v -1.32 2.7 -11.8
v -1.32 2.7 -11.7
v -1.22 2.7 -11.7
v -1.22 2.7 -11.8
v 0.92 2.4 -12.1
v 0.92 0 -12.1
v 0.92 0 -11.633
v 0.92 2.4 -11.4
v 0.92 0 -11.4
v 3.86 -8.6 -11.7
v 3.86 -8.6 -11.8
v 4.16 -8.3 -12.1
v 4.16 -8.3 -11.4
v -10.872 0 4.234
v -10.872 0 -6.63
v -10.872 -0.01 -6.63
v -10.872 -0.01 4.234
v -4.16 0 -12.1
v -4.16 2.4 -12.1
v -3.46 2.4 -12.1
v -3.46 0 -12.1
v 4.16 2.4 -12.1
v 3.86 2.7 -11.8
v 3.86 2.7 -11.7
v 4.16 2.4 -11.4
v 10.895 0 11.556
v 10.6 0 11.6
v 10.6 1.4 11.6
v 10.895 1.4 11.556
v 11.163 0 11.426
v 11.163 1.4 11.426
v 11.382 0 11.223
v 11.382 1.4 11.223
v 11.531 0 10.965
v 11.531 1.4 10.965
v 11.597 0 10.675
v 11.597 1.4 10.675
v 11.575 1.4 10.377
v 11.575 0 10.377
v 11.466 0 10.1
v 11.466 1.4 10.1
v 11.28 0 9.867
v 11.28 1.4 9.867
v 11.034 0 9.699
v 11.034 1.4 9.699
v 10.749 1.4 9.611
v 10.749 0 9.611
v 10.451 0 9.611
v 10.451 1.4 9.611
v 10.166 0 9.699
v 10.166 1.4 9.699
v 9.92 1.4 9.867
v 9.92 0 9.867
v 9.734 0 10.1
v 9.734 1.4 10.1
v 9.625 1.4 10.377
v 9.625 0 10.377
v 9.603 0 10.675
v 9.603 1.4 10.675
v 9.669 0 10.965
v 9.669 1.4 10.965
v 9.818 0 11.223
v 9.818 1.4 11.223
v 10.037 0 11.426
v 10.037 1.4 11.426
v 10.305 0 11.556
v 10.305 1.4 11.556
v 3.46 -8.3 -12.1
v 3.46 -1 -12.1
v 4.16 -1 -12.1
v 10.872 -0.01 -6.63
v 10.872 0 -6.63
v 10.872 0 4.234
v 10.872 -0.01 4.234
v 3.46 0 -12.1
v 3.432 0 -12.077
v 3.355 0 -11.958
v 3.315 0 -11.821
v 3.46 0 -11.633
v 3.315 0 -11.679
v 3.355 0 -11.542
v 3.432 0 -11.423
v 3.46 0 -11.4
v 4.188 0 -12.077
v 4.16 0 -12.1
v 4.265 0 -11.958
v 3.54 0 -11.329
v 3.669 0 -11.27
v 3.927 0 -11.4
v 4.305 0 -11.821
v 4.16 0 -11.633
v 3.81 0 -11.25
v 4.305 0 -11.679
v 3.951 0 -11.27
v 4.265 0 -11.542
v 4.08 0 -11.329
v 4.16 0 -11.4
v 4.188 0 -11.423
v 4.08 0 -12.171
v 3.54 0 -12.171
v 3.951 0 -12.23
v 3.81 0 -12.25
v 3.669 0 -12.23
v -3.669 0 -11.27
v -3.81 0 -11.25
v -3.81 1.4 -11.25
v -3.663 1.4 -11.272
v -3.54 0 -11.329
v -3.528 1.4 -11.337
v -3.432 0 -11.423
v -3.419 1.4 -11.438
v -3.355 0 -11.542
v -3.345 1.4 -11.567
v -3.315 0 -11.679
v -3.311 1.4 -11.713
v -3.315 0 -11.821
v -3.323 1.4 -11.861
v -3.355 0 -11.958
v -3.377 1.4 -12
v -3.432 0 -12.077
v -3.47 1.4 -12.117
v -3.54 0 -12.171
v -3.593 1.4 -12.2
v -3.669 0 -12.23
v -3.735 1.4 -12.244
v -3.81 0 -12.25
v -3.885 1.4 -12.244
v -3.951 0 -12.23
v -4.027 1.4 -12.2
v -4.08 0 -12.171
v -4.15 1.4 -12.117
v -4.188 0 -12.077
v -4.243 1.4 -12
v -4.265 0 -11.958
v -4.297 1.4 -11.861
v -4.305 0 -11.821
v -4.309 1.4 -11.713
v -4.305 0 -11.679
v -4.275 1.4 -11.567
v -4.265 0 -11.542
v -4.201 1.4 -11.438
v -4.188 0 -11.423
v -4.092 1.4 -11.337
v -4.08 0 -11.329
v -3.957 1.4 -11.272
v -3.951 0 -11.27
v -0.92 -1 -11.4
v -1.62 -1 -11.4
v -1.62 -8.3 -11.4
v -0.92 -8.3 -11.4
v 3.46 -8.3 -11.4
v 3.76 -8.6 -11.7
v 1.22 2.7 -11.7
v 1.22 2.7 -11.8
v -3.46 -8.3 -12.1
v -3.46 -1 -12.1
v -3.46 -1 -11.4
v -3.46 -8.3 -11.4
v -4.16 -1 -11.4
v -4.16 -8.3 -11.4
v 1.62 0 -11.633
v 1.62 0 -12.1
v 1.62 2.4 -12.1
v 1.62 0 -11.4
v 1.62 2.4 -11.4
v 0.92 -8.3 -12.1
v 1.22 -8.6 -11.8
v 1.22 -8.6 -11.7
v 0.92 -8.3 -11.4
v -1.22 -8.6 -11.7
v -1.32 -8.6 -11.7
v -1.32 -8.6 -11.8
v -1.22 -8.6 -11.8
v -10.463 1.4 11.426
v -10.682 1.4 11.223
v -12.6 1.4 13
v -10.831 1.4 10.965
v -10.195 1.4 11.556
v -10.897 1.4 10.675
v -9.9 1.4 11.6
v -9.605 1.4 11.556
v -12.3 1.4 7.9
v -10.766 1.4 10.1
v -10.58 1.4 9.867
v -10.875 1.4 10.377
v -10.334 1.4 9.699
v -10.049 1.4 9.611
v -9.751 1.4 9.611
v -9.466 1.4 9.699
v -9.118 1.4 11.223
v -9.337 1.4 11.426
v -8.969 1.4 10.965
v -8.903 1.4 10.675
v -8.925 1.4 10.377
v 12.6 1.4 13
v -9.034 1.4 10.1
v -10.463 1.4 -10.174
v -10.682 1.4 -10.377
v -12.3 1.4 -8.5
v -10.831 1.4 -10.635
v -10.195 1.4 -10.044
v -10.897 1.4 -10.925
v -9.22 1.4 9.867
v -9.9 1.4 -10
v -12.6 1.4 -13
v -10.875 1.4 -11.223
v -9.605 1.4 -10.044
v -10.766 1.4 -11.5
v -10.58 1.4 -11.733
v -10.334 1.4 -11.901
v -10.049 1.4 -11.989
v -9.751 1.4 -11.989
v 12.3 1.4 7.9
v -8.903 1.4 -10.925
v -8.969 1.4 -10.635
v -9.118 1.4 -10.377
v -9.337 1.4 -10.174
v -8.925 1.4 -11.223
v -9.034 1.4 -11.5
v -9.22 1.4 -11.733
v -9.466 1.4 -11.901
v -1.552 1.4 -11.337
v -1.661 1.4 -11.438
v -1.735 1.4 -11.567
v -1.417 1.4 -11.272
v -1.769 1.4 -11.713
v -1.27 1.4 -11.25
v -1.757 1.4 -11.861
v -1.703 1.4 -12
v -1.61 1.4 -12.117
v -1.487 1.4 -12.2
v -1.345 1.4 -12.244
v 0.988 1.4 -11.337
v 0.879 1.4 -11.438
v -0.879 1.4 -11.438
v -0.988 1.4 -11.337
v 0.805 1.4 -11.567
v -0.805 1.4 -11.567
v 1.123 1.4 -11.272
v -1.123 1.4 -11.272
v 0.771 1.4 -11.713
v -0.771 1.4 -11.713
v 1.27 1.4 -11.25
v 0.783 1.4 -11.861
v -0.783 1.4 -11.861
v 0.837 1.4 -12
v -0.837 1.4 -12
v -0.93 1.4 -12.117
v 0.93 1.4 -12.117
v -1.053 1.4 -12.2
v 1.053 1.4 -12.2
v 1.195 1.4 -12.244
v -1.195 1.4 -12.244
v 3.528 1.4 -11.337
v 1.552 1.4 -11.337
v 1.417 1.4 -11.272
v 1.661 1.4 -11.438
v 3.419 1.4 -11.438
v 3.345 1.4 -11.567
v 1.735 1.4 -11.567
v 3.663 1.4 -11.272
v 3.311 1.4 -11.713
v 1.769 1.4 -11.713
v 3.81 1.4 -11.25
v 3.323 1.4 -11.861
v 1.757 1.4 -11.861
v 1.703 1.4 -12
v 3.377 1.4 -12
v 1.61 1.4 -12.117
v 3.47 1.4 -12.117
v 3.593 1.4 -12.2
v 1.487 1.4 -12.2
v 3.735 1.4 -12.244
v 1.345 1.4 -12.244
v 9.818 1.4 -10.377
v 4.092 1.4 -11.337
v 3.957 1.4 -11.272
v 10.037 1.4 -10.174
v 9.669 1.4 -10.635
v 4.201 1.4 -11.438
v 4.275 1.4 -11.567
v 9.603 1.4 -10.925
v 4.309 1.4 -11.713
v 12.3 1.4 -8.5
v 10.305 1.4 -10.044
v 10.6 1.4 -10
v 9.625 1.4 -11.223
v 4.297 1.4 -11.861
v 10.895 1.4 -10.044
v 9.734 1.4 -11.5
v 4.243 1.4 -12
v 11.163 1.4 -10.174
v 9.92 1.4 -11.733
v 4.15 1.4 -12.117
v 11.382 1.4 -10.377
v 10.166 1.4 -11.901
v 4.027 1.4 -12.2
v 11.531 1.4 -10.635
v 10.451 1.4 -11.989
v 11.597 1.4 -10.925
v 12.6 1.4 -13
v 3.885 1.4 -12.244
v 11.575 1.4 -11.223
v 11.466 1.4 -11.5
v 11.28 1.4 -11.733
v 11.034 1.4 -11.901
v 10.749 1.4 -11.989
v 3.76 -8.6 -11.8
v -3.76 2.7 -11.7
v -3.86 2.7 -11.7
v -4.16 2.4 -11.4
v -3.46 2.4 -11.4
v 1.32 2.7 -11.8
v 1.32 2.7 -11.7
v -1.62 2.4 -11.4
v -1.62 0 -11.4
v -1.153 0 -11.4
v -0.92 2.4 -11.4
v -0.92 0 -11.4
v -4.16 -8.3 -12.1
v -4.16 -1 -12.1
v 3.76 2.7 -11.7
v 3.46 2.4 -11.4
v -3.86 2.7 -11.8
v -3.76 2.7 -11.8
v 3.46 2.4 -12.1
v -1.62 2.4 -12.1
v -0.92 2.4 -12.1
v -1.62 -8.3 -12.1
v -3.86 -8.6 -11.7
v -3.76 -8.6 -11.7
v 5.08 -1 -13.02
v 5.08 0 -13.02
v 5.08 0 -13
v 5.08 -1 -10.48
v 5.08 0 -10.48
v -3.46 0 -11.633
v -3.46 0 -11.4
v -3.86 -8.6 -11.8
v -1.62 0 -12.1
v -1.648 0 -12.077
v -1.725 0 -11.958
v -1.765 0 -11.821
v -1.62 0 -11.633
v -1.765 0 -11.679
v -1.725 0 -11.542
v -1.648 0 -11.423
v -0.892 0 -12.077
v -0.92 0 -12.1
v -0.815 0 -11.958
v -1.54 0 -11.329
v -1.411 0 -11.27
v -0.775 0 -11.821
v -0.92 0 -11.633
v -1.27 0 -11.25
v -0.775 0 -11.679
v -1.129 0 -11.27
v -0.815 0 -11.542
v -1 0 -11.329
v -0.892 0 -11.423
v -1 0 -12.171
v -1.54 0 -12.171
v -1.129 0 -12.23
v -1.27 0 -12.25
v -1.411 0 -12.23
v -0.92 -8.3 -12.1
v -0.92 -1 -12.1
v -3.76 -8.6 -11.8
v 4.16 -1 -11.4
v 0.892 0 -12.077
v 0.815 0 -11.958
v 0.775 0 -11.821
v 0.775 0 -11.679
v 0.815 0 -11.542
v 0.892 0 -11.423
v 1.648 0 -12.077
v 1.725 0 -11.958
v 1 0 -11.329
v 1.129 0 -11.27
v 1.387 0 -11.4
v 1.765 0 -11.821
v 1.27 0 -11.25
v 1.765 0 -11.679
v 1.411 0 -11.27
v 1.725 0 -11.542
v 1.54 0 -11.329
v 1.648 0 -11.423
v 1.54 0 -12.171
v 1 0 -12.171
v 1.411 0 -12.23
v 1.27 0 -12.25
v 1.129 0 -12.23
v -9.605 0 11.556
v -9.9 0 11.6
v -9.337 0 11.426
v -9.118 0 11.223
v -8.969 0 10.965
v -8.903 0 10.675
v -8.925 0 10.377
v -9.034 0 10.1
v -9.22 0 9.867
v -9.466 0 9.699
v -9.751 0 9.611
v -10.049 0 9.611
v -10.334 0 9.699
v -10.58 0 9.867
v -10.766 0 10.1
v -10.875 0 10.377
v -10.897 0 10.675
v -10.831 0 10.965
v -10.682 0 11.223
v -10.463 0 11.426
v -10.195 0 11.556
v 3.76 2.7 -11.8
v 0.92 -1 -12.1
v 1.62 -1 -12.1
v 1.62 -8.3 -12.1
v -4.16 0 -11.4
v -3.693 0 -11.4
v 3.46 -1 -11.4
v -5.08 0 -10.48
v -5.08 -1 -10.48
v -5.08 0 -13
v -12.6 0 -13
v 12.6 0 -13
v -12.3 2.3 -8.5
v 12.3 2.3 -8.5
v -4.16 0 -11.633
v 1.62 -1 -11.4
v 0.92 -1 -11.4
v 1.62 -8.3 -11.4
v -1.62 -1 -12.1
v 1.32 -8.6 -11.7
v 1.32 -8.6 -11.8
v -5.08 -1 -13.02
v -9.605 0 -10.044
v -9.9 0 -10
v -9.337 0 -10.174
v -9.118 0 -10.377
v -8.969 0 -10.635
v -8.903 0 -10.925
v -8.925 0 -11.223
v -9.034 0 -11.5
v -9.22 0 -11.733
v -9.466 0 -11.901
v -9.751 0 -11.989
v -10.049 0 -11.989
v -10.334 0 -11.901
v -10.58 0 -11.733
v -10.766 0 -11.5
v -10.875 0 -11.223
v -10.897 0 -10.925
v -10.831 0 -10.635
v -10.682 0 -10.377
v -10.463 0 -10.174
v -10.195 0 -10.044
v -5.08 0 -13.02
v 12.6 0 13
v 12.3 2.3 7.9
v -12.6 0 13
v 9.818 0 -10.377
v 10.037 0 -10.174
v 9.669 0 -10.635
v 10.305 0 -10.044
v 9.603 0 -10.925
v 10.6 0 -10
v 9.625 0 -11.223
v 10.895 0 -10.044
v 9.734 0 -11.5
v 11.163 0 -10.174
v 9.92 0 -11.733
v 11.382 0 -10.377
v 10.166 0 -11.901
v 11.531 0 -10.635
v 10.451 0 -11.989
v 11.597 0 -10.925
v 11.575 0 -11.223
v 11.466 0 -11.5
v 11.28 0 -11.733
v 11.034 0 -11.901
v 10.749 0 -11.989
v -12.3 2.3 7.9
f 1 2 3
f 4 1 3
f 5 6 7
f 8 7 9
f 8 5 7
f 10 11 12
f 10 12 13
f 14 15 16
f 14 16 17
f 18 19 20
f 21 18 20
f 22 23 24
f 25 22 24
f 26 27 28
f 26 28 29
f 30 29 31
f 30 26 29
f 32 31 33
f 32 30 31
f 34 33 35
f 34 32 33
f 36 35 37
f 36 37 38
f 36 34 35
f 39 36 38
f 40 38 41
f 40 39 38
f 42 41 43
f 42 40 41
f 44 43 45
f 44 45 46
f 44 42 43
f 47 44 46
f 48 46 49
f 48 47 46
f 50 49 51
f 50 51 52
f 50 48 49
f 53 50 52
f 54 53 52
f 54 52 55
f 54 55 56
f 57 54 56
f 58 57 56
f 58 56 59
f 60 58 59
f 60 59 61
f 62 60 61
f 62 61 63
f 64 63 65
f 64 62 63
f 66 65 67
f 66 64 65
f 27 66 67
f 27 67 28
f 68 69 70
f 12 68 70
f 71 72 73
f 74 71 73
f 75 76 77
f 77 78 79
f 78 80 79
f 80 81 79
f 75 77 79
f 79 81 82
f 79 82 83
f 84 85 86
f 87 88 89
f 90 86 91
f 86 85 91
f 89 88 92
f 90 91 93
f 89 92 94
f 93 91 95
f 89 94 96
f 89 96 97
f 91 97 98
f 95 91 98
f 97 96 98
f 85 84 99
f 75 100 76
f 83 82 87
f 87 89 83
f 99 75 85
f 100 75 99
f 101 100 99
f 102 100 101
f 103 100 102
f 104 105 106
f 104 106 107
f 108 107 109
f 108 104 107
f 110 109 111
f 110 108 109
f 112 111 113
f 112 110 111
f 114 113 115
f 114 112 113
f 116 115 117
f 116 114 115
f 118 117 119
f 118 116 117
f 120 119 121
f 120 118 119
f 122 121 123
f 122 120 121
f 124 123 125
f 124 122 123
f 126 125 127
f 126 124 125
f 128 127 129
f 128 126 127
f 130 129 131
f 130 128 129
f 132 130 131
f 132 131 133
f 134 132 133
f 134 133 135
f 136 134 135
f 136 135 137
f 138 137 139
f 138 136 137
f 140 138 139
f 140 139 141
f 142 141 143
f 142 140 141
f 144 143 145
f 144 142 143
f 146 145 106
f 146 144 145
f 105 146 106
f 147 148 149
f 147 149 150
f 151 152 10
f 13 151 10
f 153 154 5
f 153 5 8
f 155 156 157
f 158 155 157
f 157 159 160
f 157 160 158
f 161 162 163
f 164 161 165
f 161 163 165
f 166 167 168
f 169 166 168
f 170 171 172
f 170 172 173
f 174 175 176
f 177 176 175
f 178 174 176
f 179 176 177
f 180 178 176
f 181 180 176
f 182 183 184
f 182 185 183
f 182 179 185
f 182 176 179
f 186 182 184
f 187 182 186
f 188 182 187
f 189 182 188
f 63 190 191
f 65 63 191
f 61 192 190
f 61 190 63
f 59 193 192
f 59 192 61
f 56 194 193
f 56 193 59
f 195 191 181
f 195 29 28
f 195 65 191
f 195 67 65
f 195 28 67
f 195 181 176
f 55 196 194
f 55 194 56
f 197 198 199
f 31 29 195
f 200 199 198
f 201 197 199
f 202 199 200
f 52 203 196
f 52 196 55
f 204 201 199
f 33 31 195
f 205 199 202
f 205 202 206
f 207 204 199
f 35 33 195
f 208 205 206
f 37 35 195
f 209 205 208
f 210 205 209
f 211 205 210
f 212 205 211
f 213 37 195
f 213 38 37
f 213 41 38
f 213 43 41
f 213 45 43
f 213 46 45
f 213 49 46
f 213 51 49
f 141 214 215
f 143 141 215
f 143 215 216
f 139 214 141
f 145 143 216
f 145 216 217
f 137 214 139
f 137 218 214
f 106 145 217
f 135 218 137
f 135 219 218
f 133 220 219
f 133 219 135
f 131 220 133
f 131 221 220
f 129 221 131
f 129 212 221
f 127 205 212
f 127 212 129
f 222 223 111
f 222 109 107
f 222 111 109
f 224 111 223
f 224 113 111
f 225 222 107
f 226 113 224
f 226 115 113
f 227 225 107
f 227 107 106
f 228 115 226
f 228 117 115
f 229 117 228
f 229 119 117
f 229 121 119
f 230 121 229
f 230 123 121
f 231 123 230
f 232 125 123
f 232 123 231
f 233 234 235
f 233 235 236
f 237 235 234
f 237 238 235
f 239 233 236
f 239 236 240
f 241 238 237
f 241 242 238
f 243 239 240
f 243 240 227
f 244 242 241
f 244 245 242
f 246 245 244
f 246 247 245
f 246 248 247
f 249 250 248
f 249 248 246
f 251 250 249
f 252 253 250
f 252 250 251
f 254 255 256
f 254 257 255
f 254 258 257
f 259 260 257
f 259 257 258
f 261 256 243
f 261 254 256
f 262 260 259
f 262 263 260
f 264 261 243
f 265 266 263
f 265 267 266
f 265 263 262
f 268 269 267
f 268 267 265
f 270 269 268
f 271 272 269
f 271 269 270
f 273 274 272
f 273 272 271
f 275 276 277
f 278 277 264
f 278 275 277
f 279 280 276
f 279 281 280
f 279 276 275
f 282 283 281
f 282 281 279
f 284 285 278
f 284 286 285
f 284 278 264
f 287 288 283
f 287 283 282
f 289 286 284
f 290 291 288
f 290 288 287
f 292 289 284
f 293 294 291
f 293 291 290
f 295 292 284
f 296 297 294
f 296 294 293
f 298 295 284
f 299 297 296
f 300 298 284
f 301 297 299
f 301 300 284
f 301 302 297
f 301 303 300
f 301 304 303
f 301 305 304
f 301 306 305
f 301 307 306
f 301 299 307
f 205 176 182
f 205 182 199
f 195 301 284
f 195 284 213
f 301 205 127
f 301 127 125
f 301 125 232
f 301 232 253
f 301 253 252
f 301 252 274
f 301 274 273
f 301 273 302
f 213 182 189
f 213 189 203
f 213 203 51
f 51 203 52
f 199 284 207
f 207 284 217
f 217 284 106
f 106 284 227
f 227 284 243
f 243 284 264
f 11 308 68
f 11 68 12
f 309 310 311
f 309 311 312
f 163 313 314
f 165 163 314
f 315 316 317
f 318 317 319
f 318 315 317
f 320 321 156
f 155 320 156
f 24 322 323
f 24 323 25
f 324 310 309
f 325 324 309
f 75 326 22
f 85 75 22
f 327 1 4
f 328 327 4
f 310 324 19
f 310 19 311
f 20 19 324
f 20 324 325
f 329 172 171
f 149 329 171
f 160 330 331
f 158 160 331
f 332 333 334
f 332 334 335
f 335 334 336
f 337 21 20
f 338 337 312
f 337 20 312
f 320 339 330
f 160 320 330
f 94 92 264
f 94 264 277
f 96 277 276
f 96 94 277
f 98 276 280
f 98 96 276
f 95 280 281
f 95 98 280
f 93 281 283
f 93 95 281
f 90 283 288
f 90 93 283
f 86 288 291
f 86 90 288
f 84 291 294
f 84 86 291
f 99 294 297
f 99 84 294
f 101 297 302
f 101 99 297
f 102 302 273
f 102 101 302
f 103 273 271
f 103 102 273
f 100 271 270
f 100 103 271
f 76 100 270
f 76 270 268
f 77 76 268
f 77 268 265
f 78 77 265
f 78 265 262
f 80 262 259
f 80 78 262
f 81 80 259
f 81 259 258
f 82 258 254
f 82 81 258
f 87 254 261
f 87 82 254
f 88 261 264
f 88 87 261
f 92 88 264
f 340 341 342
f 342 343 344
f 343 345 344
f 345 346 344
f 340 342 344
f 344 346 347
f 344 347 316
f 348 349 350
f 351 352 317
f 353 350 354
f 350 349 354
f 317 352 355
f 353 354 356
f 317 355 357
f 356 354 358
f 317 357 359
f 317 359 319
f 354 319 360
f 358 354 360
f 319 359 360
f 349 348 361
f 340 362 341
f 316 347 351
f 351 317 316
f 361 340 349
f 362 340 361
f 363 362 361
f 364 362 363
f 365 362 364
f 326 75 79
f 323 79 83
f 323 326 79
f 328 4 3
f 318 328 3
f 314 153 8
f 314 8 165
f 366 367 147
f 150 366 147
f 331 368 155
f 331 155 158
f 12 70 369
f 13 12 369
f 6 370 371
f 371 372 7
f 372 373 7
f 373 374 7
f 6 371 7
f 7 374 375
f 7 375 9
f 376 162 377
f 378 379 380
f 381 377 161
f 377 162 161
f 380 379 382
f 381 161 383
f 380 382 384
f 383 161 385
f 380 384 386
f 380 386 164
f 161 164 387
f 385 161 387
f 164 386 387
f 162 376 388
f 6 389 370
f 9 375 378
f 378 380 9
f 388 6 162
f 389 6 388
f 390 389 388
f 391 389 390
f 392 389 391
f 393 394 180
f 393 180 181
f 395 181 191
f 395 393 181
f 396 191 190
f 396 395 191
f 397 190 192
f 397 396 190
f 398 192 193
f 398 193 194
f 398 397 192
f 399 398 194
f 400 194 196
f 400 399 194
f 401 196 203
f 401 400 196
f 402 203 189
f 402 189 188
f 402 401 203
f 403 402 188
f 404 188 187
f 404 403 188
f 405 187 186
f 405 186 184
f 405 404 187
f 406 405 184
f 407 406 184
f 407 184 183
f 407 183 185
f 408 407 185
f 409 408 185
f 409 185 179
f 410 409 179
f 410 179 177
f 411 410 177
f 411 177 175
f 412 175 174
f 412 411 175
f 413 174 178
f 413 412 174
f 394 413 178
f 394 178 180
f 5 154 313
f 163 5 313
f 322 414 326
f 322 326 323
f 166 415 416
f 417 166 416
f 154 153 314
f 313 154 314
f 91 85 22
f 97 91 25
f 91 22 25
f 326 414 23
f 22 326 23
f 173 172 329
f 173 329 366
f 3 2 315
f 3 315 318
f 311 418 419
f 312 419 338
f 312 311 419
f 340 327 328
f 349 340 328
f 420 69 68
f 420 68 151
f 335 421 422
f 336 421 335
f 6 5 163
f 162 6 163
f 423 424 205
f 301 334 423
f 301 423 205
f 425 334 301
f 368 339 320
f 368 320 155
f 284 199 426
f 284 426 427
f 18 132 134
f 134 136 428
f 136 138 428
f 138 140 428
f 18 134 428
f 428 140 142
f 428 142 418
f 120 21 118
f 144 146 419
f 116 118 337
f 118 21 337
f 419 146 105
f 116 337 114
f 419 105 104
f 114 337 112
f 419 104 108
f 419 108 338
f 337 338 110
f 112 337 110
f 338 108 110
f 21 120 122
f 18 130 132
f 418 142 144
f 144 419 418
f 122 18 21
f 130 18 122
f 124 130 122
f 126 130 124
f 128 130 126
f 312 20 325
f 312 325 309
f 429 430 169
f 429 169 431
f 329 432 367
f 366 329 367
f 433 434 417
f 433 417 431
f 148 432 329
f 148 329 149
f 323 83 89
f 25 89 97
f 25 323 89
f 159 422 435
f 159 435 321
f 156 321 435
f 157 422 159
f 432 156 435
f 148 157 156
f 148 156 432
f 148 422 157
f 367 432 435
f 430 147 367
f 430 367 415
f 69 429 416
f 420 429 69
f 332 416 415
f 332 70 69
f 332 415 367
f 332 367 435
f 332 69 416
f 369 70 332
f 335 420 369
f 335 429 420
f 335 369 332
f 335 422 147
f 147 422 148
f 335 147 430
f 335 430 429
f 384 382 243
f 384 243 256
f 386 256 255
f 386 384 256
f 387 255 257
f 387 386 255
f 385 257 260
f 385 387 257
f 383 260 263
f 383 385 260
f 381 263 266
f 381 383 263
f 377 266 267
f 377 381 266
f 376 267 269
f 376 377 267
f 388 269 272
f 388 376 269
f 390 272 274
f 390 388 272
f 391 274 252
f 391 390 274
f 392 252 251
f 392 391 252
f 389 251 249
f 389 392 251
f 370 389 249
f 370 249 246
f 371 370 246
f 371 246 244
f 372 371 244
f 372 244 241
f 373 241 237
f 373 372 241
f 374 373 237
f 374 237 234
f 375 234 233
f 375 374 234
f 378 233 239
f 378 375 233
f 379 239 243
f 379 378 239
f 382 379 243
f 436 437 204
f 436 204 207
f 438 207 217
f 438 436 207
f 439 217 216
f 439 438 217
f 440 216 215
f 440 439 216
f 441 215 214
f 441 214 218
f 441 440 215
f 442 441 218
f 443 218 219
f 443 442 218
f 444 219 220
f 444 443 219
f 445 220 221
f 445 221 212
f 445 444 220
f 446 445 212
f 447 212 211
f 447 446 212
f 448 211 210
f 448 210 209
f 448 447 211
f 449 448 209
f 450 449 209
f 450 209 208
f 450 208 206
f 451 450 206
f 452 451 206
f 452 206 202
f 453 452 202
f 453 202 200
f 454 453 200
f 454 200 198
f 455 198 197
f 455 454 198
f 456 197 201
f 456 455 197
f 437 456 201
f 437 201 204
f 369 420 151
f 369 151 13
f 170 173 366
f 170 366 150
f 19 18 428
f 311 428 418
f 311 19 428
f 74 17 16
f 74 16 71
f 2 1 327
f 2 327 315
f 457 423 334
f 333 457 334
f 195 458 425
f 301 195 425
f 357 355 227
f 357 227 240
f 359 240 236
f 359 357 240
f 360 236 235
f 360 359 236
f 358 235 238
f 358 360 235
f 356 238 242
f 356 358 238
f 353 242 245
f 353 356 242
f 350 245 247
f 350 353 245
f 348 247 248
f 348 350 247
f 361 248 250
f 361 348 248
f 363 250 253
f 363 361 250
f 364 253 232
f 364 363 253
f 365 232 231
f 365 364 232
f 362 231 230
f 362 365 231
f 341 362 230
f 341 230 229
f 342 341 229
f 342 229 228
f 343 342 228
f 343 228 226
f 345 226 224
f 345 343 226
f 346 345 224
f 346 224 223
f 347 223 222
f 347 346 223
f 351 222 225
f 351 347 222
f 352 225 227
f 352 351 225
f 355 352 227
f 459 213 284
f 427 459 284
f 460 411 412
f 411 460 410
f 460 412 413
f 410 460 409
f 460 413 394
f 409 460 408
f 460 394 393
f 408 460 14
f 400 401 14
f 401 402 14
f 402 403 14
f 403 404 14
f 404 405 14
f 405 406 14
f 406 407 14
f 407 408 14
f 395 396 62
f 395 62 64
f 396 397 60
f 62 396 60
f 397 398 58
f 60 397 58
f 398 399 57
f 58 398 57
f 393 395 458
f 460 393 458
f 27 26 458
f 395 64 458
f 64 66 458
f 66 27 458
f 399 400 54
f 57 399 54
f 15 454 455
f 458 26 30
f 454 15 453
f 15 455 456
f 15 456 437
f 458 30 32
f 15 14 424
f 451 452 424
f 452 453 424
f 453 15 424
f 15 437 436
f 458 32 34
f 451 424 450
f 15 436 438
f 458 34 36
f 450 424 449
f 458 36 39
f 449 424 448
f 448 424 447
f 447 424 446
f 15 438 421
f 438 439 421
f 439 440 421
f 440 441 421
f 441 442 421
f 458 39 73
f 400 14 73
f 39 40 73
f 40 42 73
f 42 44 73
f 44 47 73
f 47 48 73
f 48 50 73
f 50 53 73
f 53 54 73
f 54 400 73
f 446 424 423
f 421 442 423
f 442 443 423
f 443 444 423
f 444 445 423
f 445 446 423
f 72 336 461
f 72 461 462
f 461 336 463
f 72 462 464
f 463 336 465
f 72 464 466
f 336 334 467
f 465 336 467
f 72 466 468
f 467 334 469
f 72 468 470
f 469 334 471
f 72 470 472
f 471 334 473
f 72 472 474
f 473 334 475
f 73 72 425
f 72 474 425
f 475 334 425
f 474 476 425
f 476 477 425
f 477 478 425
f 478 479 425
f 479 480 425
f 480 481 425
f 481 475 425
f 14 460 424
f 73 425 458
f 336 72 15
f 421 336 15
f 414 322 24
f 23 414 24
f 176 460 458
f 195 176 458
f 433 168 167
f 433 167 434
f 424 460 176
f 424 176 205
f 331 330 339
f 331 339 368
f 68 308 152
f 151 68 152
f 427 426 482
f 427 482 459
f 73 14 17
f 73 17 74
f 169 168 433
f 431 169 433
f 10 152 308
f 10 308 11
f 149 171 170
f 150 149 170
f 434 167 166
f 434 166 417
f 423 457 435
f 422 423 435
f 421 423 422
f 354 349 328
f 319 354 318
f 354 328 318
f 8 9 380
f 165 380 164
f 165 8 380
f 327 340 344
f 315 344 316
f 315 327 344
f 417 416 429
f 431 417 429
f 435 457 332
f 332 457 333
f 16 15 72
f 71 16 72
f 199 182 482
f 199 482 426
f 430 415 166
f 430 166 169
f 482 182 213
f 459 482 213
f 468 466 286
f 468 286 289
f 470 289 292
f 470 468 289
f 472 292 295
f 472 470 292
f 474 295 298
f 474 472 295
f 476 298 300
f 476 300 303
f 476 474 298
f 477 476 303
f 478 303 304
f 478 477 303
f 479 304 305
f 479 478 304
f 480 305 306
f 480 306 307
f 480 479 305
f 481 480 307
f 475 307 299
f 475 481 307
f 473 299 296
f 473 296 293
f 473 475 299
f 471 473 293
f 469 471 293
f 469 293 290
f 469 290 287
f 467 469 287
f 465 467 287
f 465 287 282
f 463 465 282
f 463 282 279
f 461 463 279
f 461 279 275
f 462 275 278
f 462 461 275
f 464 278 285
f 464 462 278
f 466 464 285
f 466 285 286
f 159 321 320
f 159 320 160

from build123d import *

# Parameters (mm, degrees)
SKETCH1_W                = 25.2
SKETCH1_H                = 26
SKETCH1_R                = 1
SKETCH1_R_2              = 0.5
BOSS_EXTRUDE1_DEPTH      = 1.4
SKETCH2_W                = 24.6
SKETCH2_H                = 16.4
BOSS_EXTRUDE2_DEPTH      = 0.9
SKETCH3_W                = 10.16
SKETCH3_H                = 2.54
BOSS_EXTRUDE3_DEPTH      = 1
BOSS_EXTRUDE4_DEPTH      = 8.6
BOSS_EXTRUDE4_DEPTH_BACK = 2.7
SKETCH4_W                = 0.7
SKETCH4_H                = 0.7
CHAMFER1_SIZE            = 0.3
SKETCH5_W                = 21.744
SKETCH5_H                = 10.864
BOSS_EXTRUDE5_DEPTH      = 0.01


with BuildPart() as part:
    # Sketch1 → Boss-Extrude1 (new body)
    with BuildSketch(Plane(origin=(0, 0, 0), x_dir=(1, 0, 0), z_dir=(0, 1, 0))):
        Rectangle(SKETCH1_W, SKETCH1_H)
        with Locations(Location((-9.9, 11, 0), (0, 0, 270))):
            Circle(SKETCH1_R, mode=Mode.SUBTRACT)
        with Locations(Location((10.6, 11, 0), (0, 0, 270))):
            Circle(SKETCH1_R, mode=Mode.SUBTRACT)
        with Locations(Location((-9.9, -10.6, 0), (0, 0, 270))):
            Circle(SKETCH1_R, mode=Mode.SUBTRACT)
        with Locations(Location((10.6, -10.6, 0), (0, 0, 270))):
            Circle(SKETCH1_R, mode=Mode.SUBTRACT)
        with Locations(Location((-3.81, 11.75, 0), (0, 0, 270))):
            Circle(SKETCH1_R_2, mode=Mode.SUBTRACT)
        with Locations(Location((-1.27, 11.75, 0), (0, 0, 270))):
            Circle(SKETCH1_R_2, mode=Mode.SUBTRACT)
        with Locations(Location((1.27, 11.75, 0), (0, 0, 270))):
            Circle(SKETCH1_R_2, mode=Mode.SUBTRACT)
        with Locations(Location((3.81, 11.75, 0), (0, 0, 270))):
            Circle(SKETCH1_R_2, mode=Mode.SUBTRACT)
    extrude(amount=BOSS_EXTRUDE1_DEPTH)

    # Sketch2 → Boss-Extrude2 (add)
    with BuildSketch(Plane(origin=(0, 1.4, 0), x_dir=(1, 0, 0), z_dir=(0, 1, 0))):
        with Locations((0, 0.3)):
            Rectangle(SKETCH2_W, SKETCH2_H)
    extrude(amount=BOSS_EXTRUDE2_DEPTH)

    # Sketch3 → Boss-Extrude3 (add)
    with BuildSketch(Plane.XZ):
        with Locations((0, -11.75)):
            Rectangle(SKETCH3_W, SKETCH3_H)
    extrude(amount=BOSS_EXTRUDE3_DEPTH)

    # Sketch4 → Boss-Extrude4 (add, two sides: drawn at the far end of the back side and taken through both)
    with BuildSketch(Plane.XZ.offset(-BOSS_EXTRUDE4_DEPTH_BACK)):
        with Locations((-3.81, -11.75)):
            Rectangle(SKETCH4_W, SKETCH4_H)
        with Locations((-1.27, -11.75)):
            Rectangle(SKETCH4_W, SKETCH4_H)
        with Locations((1.27, -11.75)):
            Rectangle(SKETCH4_W, SKETCH4_H)
        with Locations((3.81, -11.75)):
            Rectangle(SKETCH4_W, SKETCH4_H)
    extrude(amount=BOSS_EXTRUDE4_DEPTH + BOSS_EXTRUDE4_DEPTH_BACK)

    # Chamfer1
    chamfer1_edges = [part.edges().sort_by_distance(p)[0] for p in [
        (-0.92, 2.7, -11.75),
        (-1.27, 2.7, -12.1),
        (-1.62, 2.7, -11.75),
        (-1.27, 2.7, -11.4),
        (-0.92, -8.6, -11.75),
        (-1.27, -8.6, -11.4),
        (-1.62, -8.6, -11.75),
        (-1.27, -8.6, -12.1),
        (1.62, 2.7, -11.75),
        (1.27, 2.7, -12.1),
        (0.92, 2.7, -11.75),
        (1.27, 2.7, -11.4),
        (1.62, -8.6, -11.75),
        (1.27, -8.6, -11.4),
        (0.92, -8.6, -11.75),
        (1.27, -8.6, -12.1),
        (4.16, 2.7, -11.75),
        (3.81, 2.7, -12.1),
        (3.46, 2.7, -11.75),
        (3.81, 2.7, -11.4),
        (4.16, -8.6, -11.75),
        (3.81, -8.6, -11.4),
        (3.46, -8.6, -11.75),
        (3.81, -8.6, -12.1),
        (-3.46, 2.7, -11.75),
        (-3.81, 2.7, -12.1),
        (-4.16, 2.7, -11.75),
        (-3.81, 2.7, -11.4),
        (-3.46, -8.6, -11.75),
        (-3.81, -8.6, -11.4),
        (-4.16, -8.6, -11.75),
        (-3.81, -8.6, -12.1),
    ]]
    chamfer(chamfer1_edges, length=CHAMFER1_SIZE)

    # Sketch5 → Boss-Extrude5 (add)
    with BuildSketch(Plane.XZ):
        with Locations((0, -1.198)):
            Rectangle(SKETCH5_W, SKETCH5_H)
    extrude(amount=BOSS_EXTRUDE5_DEPTH)


solid = part.part
